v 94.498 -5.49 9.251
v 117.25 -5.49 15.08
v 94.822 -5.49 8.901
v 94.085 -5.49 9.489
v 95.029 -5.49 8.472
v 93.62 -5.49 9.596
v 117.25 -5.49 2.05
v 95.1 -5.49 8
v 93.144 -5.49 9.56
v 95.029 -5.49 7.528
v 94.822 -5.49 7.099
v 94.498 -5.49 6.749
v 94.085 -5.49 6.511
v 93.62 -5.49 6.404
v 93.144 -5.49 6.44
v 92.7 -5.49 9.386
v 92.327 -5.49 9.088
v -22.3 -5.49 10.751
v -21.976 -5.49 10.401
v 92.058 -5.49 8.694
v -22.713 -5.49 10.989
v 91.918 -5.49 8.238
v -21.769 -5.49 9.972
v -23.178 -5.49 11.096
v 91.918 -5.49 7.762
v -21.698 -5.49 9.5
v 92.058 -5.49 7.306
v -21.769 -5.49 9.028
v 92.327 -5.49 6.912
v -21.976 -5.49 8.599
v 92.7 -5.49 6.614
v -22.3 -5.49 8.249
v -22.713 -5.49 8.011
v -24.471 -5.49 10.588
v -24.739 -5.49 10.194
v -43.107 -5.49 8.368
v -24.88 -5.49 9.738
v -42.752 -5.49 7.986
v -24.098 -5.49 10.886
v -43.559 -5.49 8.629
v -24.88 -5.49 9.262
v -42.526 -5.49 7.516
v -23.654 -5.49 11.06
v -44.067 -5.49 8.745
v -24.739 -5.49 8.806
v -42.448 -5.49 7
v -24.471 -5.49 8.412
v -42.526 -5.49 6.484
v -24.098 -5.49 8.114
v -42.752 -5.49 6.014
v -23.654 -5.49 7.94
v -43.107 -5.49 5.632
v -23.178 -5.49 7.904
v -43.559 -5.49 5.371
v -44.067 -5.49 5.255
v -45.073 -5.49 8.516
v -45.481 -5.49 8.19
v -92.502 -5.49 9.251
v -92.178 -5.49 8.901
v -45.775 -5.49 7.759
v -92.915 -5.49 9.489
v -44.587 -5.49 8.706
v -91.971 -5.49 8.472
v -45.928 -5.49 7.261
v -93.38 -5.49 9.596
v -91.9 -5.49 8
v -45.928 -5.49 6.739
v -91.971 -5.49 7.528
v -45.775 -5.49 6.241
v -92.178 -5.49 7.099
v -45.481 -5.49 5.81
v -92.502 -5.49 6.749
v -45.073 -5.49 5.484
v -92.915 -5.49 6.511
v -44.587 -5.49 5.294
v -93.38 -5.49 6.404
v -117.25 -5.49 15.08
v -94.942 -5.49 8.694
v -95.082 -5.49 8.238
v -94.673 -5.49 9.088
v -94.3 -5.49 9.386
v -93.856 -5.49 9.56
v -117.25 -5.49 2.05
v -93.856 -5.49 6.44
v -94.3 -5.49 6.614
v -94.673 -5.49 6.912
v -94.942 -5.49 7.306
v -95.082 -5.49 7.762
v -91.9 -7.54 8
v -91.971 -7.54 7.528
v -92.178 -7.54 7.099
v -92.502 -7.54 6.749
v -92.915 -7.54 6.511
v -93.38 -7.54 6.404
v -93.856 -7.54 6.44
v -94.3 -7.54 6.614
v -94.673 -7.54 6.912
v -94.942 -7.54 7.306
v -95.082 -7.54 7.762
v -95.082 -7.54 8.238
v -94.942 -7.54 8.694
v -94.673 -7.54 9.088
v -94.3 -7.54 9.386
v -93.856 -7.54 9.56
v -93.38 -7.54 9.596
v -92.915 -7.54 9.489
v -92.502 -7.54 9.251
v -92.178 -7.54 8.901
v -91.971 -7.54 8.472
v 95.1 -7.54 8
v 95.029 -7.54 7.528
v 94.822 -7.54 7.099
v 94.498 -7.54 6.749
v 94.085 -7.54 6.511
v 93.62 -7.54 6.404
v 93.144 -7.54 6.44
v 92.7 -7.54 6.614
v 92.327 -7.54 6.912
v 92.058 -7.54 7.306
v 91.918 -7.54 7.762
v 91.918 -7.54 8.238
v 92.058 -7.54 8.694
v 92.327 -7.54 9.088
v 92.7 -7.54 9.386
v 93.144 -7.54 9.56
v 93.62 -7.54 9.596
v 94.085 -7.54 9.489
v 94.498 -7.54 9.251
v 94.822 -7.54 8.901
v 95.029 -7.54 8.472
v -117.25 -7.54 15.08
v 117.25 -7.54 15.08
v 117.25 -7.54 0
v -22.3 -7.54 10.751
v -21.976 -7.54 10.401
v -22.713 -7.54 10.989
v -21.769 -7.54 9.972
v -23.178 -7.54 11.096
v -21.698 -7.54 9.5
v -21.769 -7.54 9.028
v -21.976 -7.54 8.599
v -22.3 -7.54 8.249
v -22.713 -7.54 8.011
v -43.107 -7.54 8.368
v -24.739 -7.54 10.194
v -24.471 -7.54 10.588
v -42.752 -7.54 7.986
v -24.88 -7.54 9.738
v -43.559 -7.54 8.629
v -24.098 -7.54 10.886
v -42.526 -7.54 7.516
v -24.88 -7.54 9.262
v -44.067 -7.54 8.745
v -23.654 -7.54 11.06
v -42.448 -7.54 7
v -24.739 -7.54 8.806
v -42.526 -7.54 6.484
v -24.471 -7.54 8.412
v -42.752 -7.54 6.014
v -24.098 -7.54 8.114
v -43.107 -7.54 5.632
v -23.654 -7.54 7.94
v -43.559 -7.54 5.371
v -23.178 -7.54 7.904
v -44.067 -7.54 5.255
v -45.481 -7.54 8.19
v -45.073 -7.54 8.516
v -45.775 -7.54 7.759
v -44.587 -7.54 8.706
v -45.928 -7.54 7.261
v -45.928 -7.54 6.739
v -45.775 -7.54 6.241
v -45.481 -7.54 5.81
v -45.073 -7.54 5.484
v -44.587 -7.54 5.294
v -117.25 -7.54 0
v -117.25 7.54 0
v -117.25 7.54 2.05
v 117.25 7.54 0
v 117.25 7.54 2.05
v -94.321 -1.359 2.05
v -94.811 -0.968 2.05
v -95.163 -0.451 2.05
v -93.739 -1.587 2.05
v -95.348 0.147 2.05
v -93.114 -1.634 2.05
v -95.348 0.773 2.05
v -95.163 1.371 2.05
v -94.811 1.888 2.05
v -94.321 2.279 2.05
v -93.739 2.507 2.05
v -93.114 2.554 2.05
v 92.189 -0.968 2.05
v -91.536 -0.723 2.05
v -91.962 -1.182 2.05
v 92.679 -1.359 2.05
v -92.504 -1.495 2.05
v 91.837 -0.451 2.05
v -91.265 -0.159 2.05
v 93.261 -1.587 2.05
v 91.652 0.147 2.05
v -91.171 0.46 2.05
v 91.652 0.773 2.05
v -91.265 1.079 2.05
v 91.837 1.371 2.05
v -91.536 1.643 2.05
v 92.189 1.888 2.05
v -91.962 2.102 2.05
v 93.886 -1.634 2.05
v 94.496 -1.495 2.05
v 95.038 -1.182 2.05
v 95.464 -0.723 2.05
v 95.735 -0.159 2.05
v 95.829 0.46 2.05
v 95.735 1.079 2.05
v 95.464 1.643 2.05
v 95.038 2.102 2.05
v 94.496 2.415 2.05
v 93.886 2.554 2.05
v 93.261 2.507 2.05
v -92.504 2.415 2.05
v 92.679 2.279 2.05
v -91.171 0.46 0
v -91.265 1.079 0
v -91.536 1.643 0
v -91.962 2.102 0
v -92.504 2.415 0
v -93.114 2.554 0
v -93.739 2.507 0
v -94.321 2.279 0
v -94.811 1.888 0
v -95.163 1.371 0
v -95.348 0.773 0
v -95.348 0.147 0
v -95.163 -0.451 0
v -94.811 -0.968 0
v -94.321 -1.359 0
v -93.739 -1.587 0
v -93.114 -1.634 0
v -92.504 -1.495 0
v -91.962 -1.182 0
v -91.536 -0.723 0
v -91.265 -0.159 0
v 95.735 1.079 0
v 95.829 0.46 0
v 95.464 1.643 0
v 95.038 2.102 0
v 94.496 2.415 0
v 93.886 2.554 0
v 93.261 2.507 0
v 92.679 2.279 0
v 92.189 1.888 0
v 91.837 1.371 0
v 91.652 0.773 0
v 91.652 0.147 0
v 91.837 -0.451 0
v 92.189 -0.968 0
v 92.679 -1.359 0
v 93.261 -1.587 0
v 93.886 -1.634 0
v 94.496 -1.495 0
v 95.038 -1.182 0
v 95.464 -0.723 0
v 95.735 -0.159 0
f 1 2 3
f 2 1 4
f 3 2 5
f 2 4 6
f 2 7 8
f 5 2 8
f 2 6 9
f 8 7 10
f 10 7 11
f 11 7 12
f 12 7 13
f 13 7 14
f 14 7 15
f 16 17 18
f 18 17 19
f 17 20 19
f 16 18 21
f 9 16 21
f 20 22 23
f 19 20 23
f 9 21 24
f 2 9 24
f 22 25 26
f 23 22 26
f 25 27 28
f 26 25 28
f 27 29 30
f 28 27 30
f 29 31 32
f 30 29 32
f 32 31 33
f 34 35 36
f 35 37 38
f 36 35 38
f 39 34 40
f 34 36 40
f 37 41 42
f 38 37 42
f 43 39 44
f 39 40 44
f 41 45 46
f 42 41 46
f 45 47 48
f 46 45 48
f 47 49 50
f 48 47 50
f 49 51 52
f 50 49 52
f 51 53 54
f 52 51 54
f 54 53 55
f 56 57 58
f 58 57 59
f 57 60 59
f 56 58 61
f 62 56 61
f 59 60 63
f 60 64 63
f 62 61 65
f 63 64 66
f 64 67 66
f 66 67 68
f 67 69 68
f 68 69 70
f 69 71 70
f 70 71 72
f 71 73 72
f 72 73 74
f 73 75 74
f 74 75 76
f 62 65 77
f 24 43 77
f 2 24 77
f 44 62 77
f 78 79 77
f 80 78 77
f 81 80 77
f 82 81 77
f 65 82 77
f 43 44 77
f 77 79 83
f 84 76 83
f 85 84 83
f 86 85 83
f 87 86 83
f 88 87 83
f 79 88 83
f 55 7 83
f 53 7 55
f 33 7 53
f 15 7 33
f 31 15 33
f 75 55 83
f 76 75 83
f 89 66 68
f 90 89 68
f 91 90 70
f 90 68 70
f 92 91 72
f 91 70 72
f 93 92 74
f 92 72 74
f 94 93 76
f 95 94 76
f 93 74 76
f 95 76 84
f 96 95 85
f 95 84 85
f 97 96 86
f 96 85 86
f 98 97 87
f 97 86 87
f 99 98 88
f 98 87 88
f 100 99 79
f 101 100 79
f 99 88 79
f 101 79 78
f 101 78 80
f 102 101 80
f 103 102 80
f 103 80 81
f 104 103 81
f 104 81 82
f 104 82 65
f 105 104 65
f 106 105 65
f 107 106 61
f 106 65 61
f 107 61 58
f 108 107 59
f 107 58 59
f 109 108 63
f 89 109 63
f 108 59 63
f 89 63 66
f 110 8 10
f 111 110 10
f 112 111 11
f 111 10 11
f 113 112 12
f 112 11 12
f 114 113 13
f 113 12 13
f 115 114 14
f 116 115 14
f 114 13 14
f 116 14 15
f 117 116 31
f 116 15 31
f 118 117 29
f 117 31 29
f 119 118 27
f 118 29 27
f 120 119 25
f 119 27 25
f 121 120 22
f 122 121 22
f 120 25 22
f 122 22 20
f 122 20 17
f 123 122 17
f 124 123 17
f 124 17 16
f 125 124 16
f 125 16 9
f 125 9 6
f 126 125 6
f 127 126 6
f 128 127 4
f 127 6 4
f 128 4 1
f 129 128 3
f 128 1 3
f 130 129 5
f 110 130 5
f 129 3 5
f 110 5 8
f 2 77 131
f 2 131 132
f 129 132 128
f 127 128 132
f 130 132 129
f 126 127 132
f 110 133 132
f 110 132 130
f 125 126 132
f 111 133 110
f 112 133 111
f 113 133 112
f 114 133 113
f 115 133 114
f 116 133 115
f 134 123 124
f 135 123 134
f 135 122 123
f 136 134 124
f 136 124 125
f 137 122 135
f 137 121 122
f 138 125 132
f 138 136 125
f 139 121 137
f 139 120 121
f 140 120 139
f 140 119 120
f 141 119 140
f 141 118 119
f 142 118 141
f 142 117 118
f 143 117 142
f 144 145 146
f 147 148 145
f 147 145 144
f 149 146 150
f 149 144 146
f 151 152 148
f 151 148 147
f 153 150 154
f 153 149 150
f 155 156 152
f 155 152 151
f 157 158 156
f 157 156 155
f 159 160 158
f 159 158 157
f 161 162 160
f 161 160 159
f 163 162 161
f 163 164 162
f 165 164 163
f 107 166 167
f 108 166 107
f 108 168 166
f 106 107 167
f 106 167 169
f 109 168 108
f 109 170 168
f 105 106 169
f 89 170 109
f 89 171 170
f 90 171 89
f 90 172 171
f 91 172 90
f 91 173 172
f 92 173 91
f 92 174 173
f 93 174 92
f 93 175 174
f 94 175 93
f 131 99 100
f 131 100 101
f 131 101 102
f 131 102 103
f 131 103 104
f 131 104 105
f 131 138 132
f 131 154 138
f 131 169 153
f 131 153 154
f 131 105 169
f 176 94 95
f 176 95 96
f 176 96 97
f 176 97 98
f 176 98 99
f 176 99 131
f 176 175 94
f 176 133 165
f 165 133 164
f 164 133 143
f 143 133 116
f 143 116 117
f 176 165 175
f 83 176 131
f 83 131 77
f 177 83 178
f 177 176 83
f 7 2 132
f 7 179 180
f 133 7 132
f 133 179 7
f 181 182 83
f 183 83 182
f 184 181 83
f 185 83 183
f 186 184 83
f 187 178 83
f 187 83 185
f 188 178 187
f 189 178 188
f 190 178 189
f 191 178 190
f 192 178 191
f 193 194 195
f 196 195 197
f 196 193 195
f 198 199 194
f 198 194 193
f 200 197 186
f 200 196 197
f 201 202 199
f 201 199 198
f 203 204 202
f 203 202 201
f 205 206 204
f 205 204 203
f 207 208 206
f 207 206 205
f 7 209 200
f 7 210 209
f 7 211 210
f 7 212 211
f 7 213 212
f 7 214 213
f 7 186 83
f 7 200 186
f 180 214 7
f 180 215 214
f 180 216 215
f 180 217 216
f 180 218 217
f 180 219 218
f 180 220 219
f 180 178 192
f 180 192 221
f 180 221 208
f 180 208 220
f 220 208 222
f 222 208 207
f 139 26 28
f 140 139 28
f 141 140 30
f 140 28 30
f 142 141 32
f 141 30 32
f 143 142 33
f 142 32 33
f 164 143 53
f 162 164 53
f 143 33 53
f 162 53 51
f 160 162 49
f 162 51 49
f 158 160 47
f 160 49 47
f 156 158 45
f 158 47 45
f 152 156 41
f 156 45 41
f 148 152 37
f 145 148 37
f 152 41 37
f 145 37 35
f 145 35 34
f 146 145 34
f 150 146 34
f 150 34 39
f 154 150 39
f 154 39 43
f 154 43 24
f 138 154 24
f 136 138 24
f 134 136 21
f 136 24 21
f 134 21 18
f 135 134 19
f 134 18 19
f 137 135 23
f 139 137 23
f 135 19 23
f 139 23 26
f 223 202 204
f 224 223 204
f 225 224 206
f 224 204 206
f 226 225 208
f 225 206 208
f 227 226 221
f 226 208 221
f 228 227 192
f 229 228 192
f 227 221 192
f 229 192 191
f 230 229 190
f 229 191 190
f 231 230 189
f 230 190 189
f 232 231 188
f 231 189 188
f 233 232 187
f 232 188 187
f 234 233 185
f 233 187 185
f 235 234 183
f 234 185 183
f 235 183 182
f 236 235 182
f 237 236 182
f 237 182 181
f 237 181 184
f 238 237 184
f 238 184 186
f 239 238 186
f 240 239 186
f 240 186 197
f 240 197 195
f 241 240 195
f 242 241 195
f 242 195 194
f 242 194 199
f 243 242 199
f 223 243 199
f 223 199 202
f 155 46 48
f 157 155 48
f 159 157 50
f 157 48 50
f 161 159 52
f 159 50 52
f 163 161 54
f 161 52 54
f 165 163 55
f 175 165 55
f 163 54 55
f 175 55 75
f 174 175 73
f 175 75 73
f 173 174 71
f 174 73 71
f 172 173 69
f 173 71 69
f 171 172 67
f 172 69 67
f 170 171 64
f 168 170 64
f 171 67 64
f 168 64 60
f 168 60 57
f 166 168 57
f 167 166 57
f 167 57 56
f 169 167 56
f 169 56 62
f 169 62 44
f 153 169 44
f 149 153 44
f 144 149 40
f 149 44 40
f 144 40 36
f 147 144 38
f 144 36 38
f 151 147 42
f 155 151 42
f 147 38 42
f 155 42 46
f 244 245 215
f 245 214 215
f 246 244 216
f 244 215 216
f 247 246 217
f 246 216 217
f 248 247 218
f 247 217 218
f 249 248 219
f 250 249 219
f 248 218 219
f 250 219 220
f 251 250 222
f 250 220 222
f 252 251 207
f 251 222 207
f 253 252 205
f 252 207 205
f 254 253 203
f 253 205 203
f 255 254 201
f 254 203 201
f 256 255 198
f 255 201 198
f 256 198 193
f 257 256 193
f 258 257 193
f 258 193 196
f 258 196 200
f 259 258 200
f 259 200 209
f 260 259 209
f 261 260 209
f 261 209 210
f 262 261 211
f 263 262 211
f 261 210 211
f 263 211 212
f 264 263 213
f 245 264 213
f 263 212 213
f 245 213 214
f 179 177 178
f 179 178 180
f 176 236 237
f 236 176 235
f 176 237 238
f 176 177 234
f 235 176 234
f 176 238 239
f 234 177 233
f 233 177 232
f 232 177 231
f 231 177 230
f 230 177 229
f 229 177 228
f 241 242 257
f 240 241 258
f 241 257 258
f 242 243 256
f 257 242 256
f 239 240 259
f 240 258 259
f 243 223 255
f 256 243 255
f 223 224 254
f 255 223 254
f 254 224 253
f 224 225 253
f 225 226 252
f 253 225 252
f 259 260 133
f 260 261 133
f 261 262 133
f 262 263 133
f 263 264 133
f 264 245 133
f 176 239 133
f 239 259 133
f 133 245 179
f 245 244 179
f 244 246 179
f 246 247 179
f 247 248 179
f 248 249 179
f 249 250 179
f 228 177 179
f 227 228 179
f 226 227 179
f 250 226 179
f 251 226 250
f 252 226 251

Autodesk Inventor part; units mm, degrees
ref_plane "YZ Plane" through (0, 0, 0) normal (1, 0, 0) x (0, 1, 0)
ref_plane "XZ Plane" through (0, 0, 0) normal (0, 1, 0) x (-1, 0, 0)
ref_plane "XY Plane" through (0, 0, 0) normal (0, 0, 1) x (1, 0, 0)
sketch "Sketch1" plane through (0, 0, 0) normal (0, 0, 1) x (1, 0, 0)
  line L0 (117.25, -7.54) -> (-117.25, -7.54)
  line L1 (-117.25, -7.54) -> (-117.25, 7.54)
  line L2 (-117.25, 7.54) -> (117.25, 7.54)
  line L3 (117.25, 7.54) -> (117.25, -7.54)
  line L4 (117.25, -7.54) -> (-117.25, 7.54) construction
  line L5 (-117.25, -7.54) -> (117.25, 7.54) construction
  point P0 (0, 0)
  dimension "d0" = 234.5
  dimension "d1" = 15.08
extrude "Extrusion1" add sketch "Sketch1" along normal blind 2.05
sketch "Sketch2" plane through (0, 0, 2.05) normal (0, 0, 1) x (1, 0, 0)
  line L0 (-117.25, -7.54) -> (117.25, -7.54) projected
  line L1 (117.25, -7.54) -> (117.25, 7.54) projected
  line L2 (-117.25, -7.54) -> (117.25, -7.54)
  line L3 (117.25, -7.54) -> (117.25, -5.49)
  line L4 (117.25, -5.49) -> (-117.25, -5.49)
  line L5 (-117.25, -5.49) -> (-117.25, -7.54)
  point P0 (0, 0)
  dimension "d4" = 2.05
extrude "Extrusion2" add sketch "Sketch2" along normal blind 13.03
sketch "Sketch3" plane through (-117.25, -5.49, 2.05) normal (0, 1, 0) x (1, 0, 0)
  circle A0 centre (23.75, -5.95) radius 1.6
  circle A1 centre (210.75, -5.95) radius 1.6
  line L0 (117.25, 2.05) -> (117.25, -13.2508)
  line L1 (0, 2.05) -> (234.5, 2.05) projected
  dimension "d7" = 93.5
  dimension "d8" = 93.5
  dimension "d9" = 8
  dimension "d10" = 8
  dimension "d13" = 3.2
  dimension "d14" = 3.2
extrude "Extrusion3" cut sketch "Sketch3" against normal blind 2.05
sketch "Sketch4" plane through (-117.25, -7.54, 0) normal (0, -1, 0) x (1, 0, 0)
  circle A0 centre (77.4621, 9.6496) radius 1.9
  point P0 (117.25, 0)
  dimension "d15" = 3.8
sketch "Sketch6" plane through (-117.25, -5.49, 2.05) normal (0, 1, 0) x (1, 0, 0)
  circle A0 centre (73.0521, -4.95) radius 1.75 projected
  point P0 (117.25, 2.05)
extrude "Extrusion6" cut sketch "Sketch6" against normal blind 3
sketch "Sketch7" plane through (-117.25, -5.49, 2.05) normal (0, 1, 0) x (1, 0, 0)
  circle A0 centre (73.0521, -4.95) radius 1.75 projected
  circle A1 centre (23.75, -5.95) radius 1.6 projected
  circle A2 centre (210.75, -5.95) radius 1.6 projected
  line L0 (0, 0) -> (234.5, 0) projected
  line L1 (0, 0) -> (0, -13.03) projected
  line L2 (234.5, -13.03) -> (0, -13.03) projected
  line L3 (234.5, 0) -> (234.5, -13.03) projected
  circle A3 centre (93.9521, -7.45) radius 1.6 projected
  point P0 (117.25, 2.05)
extrude "Extrusion7" cut sketch "Sketch7" against normal blind 10 contours A3
sketch "Sketch8" plane through (0, 0, 2.05) normal (0, 0, 1) x (1, 0, 0)
  line L0 (-117.25, -5.49) -> (117.25, -5.49) projected
  line L1 (117.25, -5.49) -> (117.25, 7.54) projected
  line L2 (117.25, 7.54) -> (-117.25, 7.54) projected
  line L3 (-117.25, 7.54) -> (-117.25, -5.49) projected
  circle A0 centre (-93.2713, 0.46) radius 2.1 projected
  circle A1 centre (93.7287, 0.46) radius 2.1 projected
  point P0 (0, 0)
extrude "Extrusion8" cut sketch "Sketch8" against normal blind 10 contours A0 | A1
properties part number "L"
